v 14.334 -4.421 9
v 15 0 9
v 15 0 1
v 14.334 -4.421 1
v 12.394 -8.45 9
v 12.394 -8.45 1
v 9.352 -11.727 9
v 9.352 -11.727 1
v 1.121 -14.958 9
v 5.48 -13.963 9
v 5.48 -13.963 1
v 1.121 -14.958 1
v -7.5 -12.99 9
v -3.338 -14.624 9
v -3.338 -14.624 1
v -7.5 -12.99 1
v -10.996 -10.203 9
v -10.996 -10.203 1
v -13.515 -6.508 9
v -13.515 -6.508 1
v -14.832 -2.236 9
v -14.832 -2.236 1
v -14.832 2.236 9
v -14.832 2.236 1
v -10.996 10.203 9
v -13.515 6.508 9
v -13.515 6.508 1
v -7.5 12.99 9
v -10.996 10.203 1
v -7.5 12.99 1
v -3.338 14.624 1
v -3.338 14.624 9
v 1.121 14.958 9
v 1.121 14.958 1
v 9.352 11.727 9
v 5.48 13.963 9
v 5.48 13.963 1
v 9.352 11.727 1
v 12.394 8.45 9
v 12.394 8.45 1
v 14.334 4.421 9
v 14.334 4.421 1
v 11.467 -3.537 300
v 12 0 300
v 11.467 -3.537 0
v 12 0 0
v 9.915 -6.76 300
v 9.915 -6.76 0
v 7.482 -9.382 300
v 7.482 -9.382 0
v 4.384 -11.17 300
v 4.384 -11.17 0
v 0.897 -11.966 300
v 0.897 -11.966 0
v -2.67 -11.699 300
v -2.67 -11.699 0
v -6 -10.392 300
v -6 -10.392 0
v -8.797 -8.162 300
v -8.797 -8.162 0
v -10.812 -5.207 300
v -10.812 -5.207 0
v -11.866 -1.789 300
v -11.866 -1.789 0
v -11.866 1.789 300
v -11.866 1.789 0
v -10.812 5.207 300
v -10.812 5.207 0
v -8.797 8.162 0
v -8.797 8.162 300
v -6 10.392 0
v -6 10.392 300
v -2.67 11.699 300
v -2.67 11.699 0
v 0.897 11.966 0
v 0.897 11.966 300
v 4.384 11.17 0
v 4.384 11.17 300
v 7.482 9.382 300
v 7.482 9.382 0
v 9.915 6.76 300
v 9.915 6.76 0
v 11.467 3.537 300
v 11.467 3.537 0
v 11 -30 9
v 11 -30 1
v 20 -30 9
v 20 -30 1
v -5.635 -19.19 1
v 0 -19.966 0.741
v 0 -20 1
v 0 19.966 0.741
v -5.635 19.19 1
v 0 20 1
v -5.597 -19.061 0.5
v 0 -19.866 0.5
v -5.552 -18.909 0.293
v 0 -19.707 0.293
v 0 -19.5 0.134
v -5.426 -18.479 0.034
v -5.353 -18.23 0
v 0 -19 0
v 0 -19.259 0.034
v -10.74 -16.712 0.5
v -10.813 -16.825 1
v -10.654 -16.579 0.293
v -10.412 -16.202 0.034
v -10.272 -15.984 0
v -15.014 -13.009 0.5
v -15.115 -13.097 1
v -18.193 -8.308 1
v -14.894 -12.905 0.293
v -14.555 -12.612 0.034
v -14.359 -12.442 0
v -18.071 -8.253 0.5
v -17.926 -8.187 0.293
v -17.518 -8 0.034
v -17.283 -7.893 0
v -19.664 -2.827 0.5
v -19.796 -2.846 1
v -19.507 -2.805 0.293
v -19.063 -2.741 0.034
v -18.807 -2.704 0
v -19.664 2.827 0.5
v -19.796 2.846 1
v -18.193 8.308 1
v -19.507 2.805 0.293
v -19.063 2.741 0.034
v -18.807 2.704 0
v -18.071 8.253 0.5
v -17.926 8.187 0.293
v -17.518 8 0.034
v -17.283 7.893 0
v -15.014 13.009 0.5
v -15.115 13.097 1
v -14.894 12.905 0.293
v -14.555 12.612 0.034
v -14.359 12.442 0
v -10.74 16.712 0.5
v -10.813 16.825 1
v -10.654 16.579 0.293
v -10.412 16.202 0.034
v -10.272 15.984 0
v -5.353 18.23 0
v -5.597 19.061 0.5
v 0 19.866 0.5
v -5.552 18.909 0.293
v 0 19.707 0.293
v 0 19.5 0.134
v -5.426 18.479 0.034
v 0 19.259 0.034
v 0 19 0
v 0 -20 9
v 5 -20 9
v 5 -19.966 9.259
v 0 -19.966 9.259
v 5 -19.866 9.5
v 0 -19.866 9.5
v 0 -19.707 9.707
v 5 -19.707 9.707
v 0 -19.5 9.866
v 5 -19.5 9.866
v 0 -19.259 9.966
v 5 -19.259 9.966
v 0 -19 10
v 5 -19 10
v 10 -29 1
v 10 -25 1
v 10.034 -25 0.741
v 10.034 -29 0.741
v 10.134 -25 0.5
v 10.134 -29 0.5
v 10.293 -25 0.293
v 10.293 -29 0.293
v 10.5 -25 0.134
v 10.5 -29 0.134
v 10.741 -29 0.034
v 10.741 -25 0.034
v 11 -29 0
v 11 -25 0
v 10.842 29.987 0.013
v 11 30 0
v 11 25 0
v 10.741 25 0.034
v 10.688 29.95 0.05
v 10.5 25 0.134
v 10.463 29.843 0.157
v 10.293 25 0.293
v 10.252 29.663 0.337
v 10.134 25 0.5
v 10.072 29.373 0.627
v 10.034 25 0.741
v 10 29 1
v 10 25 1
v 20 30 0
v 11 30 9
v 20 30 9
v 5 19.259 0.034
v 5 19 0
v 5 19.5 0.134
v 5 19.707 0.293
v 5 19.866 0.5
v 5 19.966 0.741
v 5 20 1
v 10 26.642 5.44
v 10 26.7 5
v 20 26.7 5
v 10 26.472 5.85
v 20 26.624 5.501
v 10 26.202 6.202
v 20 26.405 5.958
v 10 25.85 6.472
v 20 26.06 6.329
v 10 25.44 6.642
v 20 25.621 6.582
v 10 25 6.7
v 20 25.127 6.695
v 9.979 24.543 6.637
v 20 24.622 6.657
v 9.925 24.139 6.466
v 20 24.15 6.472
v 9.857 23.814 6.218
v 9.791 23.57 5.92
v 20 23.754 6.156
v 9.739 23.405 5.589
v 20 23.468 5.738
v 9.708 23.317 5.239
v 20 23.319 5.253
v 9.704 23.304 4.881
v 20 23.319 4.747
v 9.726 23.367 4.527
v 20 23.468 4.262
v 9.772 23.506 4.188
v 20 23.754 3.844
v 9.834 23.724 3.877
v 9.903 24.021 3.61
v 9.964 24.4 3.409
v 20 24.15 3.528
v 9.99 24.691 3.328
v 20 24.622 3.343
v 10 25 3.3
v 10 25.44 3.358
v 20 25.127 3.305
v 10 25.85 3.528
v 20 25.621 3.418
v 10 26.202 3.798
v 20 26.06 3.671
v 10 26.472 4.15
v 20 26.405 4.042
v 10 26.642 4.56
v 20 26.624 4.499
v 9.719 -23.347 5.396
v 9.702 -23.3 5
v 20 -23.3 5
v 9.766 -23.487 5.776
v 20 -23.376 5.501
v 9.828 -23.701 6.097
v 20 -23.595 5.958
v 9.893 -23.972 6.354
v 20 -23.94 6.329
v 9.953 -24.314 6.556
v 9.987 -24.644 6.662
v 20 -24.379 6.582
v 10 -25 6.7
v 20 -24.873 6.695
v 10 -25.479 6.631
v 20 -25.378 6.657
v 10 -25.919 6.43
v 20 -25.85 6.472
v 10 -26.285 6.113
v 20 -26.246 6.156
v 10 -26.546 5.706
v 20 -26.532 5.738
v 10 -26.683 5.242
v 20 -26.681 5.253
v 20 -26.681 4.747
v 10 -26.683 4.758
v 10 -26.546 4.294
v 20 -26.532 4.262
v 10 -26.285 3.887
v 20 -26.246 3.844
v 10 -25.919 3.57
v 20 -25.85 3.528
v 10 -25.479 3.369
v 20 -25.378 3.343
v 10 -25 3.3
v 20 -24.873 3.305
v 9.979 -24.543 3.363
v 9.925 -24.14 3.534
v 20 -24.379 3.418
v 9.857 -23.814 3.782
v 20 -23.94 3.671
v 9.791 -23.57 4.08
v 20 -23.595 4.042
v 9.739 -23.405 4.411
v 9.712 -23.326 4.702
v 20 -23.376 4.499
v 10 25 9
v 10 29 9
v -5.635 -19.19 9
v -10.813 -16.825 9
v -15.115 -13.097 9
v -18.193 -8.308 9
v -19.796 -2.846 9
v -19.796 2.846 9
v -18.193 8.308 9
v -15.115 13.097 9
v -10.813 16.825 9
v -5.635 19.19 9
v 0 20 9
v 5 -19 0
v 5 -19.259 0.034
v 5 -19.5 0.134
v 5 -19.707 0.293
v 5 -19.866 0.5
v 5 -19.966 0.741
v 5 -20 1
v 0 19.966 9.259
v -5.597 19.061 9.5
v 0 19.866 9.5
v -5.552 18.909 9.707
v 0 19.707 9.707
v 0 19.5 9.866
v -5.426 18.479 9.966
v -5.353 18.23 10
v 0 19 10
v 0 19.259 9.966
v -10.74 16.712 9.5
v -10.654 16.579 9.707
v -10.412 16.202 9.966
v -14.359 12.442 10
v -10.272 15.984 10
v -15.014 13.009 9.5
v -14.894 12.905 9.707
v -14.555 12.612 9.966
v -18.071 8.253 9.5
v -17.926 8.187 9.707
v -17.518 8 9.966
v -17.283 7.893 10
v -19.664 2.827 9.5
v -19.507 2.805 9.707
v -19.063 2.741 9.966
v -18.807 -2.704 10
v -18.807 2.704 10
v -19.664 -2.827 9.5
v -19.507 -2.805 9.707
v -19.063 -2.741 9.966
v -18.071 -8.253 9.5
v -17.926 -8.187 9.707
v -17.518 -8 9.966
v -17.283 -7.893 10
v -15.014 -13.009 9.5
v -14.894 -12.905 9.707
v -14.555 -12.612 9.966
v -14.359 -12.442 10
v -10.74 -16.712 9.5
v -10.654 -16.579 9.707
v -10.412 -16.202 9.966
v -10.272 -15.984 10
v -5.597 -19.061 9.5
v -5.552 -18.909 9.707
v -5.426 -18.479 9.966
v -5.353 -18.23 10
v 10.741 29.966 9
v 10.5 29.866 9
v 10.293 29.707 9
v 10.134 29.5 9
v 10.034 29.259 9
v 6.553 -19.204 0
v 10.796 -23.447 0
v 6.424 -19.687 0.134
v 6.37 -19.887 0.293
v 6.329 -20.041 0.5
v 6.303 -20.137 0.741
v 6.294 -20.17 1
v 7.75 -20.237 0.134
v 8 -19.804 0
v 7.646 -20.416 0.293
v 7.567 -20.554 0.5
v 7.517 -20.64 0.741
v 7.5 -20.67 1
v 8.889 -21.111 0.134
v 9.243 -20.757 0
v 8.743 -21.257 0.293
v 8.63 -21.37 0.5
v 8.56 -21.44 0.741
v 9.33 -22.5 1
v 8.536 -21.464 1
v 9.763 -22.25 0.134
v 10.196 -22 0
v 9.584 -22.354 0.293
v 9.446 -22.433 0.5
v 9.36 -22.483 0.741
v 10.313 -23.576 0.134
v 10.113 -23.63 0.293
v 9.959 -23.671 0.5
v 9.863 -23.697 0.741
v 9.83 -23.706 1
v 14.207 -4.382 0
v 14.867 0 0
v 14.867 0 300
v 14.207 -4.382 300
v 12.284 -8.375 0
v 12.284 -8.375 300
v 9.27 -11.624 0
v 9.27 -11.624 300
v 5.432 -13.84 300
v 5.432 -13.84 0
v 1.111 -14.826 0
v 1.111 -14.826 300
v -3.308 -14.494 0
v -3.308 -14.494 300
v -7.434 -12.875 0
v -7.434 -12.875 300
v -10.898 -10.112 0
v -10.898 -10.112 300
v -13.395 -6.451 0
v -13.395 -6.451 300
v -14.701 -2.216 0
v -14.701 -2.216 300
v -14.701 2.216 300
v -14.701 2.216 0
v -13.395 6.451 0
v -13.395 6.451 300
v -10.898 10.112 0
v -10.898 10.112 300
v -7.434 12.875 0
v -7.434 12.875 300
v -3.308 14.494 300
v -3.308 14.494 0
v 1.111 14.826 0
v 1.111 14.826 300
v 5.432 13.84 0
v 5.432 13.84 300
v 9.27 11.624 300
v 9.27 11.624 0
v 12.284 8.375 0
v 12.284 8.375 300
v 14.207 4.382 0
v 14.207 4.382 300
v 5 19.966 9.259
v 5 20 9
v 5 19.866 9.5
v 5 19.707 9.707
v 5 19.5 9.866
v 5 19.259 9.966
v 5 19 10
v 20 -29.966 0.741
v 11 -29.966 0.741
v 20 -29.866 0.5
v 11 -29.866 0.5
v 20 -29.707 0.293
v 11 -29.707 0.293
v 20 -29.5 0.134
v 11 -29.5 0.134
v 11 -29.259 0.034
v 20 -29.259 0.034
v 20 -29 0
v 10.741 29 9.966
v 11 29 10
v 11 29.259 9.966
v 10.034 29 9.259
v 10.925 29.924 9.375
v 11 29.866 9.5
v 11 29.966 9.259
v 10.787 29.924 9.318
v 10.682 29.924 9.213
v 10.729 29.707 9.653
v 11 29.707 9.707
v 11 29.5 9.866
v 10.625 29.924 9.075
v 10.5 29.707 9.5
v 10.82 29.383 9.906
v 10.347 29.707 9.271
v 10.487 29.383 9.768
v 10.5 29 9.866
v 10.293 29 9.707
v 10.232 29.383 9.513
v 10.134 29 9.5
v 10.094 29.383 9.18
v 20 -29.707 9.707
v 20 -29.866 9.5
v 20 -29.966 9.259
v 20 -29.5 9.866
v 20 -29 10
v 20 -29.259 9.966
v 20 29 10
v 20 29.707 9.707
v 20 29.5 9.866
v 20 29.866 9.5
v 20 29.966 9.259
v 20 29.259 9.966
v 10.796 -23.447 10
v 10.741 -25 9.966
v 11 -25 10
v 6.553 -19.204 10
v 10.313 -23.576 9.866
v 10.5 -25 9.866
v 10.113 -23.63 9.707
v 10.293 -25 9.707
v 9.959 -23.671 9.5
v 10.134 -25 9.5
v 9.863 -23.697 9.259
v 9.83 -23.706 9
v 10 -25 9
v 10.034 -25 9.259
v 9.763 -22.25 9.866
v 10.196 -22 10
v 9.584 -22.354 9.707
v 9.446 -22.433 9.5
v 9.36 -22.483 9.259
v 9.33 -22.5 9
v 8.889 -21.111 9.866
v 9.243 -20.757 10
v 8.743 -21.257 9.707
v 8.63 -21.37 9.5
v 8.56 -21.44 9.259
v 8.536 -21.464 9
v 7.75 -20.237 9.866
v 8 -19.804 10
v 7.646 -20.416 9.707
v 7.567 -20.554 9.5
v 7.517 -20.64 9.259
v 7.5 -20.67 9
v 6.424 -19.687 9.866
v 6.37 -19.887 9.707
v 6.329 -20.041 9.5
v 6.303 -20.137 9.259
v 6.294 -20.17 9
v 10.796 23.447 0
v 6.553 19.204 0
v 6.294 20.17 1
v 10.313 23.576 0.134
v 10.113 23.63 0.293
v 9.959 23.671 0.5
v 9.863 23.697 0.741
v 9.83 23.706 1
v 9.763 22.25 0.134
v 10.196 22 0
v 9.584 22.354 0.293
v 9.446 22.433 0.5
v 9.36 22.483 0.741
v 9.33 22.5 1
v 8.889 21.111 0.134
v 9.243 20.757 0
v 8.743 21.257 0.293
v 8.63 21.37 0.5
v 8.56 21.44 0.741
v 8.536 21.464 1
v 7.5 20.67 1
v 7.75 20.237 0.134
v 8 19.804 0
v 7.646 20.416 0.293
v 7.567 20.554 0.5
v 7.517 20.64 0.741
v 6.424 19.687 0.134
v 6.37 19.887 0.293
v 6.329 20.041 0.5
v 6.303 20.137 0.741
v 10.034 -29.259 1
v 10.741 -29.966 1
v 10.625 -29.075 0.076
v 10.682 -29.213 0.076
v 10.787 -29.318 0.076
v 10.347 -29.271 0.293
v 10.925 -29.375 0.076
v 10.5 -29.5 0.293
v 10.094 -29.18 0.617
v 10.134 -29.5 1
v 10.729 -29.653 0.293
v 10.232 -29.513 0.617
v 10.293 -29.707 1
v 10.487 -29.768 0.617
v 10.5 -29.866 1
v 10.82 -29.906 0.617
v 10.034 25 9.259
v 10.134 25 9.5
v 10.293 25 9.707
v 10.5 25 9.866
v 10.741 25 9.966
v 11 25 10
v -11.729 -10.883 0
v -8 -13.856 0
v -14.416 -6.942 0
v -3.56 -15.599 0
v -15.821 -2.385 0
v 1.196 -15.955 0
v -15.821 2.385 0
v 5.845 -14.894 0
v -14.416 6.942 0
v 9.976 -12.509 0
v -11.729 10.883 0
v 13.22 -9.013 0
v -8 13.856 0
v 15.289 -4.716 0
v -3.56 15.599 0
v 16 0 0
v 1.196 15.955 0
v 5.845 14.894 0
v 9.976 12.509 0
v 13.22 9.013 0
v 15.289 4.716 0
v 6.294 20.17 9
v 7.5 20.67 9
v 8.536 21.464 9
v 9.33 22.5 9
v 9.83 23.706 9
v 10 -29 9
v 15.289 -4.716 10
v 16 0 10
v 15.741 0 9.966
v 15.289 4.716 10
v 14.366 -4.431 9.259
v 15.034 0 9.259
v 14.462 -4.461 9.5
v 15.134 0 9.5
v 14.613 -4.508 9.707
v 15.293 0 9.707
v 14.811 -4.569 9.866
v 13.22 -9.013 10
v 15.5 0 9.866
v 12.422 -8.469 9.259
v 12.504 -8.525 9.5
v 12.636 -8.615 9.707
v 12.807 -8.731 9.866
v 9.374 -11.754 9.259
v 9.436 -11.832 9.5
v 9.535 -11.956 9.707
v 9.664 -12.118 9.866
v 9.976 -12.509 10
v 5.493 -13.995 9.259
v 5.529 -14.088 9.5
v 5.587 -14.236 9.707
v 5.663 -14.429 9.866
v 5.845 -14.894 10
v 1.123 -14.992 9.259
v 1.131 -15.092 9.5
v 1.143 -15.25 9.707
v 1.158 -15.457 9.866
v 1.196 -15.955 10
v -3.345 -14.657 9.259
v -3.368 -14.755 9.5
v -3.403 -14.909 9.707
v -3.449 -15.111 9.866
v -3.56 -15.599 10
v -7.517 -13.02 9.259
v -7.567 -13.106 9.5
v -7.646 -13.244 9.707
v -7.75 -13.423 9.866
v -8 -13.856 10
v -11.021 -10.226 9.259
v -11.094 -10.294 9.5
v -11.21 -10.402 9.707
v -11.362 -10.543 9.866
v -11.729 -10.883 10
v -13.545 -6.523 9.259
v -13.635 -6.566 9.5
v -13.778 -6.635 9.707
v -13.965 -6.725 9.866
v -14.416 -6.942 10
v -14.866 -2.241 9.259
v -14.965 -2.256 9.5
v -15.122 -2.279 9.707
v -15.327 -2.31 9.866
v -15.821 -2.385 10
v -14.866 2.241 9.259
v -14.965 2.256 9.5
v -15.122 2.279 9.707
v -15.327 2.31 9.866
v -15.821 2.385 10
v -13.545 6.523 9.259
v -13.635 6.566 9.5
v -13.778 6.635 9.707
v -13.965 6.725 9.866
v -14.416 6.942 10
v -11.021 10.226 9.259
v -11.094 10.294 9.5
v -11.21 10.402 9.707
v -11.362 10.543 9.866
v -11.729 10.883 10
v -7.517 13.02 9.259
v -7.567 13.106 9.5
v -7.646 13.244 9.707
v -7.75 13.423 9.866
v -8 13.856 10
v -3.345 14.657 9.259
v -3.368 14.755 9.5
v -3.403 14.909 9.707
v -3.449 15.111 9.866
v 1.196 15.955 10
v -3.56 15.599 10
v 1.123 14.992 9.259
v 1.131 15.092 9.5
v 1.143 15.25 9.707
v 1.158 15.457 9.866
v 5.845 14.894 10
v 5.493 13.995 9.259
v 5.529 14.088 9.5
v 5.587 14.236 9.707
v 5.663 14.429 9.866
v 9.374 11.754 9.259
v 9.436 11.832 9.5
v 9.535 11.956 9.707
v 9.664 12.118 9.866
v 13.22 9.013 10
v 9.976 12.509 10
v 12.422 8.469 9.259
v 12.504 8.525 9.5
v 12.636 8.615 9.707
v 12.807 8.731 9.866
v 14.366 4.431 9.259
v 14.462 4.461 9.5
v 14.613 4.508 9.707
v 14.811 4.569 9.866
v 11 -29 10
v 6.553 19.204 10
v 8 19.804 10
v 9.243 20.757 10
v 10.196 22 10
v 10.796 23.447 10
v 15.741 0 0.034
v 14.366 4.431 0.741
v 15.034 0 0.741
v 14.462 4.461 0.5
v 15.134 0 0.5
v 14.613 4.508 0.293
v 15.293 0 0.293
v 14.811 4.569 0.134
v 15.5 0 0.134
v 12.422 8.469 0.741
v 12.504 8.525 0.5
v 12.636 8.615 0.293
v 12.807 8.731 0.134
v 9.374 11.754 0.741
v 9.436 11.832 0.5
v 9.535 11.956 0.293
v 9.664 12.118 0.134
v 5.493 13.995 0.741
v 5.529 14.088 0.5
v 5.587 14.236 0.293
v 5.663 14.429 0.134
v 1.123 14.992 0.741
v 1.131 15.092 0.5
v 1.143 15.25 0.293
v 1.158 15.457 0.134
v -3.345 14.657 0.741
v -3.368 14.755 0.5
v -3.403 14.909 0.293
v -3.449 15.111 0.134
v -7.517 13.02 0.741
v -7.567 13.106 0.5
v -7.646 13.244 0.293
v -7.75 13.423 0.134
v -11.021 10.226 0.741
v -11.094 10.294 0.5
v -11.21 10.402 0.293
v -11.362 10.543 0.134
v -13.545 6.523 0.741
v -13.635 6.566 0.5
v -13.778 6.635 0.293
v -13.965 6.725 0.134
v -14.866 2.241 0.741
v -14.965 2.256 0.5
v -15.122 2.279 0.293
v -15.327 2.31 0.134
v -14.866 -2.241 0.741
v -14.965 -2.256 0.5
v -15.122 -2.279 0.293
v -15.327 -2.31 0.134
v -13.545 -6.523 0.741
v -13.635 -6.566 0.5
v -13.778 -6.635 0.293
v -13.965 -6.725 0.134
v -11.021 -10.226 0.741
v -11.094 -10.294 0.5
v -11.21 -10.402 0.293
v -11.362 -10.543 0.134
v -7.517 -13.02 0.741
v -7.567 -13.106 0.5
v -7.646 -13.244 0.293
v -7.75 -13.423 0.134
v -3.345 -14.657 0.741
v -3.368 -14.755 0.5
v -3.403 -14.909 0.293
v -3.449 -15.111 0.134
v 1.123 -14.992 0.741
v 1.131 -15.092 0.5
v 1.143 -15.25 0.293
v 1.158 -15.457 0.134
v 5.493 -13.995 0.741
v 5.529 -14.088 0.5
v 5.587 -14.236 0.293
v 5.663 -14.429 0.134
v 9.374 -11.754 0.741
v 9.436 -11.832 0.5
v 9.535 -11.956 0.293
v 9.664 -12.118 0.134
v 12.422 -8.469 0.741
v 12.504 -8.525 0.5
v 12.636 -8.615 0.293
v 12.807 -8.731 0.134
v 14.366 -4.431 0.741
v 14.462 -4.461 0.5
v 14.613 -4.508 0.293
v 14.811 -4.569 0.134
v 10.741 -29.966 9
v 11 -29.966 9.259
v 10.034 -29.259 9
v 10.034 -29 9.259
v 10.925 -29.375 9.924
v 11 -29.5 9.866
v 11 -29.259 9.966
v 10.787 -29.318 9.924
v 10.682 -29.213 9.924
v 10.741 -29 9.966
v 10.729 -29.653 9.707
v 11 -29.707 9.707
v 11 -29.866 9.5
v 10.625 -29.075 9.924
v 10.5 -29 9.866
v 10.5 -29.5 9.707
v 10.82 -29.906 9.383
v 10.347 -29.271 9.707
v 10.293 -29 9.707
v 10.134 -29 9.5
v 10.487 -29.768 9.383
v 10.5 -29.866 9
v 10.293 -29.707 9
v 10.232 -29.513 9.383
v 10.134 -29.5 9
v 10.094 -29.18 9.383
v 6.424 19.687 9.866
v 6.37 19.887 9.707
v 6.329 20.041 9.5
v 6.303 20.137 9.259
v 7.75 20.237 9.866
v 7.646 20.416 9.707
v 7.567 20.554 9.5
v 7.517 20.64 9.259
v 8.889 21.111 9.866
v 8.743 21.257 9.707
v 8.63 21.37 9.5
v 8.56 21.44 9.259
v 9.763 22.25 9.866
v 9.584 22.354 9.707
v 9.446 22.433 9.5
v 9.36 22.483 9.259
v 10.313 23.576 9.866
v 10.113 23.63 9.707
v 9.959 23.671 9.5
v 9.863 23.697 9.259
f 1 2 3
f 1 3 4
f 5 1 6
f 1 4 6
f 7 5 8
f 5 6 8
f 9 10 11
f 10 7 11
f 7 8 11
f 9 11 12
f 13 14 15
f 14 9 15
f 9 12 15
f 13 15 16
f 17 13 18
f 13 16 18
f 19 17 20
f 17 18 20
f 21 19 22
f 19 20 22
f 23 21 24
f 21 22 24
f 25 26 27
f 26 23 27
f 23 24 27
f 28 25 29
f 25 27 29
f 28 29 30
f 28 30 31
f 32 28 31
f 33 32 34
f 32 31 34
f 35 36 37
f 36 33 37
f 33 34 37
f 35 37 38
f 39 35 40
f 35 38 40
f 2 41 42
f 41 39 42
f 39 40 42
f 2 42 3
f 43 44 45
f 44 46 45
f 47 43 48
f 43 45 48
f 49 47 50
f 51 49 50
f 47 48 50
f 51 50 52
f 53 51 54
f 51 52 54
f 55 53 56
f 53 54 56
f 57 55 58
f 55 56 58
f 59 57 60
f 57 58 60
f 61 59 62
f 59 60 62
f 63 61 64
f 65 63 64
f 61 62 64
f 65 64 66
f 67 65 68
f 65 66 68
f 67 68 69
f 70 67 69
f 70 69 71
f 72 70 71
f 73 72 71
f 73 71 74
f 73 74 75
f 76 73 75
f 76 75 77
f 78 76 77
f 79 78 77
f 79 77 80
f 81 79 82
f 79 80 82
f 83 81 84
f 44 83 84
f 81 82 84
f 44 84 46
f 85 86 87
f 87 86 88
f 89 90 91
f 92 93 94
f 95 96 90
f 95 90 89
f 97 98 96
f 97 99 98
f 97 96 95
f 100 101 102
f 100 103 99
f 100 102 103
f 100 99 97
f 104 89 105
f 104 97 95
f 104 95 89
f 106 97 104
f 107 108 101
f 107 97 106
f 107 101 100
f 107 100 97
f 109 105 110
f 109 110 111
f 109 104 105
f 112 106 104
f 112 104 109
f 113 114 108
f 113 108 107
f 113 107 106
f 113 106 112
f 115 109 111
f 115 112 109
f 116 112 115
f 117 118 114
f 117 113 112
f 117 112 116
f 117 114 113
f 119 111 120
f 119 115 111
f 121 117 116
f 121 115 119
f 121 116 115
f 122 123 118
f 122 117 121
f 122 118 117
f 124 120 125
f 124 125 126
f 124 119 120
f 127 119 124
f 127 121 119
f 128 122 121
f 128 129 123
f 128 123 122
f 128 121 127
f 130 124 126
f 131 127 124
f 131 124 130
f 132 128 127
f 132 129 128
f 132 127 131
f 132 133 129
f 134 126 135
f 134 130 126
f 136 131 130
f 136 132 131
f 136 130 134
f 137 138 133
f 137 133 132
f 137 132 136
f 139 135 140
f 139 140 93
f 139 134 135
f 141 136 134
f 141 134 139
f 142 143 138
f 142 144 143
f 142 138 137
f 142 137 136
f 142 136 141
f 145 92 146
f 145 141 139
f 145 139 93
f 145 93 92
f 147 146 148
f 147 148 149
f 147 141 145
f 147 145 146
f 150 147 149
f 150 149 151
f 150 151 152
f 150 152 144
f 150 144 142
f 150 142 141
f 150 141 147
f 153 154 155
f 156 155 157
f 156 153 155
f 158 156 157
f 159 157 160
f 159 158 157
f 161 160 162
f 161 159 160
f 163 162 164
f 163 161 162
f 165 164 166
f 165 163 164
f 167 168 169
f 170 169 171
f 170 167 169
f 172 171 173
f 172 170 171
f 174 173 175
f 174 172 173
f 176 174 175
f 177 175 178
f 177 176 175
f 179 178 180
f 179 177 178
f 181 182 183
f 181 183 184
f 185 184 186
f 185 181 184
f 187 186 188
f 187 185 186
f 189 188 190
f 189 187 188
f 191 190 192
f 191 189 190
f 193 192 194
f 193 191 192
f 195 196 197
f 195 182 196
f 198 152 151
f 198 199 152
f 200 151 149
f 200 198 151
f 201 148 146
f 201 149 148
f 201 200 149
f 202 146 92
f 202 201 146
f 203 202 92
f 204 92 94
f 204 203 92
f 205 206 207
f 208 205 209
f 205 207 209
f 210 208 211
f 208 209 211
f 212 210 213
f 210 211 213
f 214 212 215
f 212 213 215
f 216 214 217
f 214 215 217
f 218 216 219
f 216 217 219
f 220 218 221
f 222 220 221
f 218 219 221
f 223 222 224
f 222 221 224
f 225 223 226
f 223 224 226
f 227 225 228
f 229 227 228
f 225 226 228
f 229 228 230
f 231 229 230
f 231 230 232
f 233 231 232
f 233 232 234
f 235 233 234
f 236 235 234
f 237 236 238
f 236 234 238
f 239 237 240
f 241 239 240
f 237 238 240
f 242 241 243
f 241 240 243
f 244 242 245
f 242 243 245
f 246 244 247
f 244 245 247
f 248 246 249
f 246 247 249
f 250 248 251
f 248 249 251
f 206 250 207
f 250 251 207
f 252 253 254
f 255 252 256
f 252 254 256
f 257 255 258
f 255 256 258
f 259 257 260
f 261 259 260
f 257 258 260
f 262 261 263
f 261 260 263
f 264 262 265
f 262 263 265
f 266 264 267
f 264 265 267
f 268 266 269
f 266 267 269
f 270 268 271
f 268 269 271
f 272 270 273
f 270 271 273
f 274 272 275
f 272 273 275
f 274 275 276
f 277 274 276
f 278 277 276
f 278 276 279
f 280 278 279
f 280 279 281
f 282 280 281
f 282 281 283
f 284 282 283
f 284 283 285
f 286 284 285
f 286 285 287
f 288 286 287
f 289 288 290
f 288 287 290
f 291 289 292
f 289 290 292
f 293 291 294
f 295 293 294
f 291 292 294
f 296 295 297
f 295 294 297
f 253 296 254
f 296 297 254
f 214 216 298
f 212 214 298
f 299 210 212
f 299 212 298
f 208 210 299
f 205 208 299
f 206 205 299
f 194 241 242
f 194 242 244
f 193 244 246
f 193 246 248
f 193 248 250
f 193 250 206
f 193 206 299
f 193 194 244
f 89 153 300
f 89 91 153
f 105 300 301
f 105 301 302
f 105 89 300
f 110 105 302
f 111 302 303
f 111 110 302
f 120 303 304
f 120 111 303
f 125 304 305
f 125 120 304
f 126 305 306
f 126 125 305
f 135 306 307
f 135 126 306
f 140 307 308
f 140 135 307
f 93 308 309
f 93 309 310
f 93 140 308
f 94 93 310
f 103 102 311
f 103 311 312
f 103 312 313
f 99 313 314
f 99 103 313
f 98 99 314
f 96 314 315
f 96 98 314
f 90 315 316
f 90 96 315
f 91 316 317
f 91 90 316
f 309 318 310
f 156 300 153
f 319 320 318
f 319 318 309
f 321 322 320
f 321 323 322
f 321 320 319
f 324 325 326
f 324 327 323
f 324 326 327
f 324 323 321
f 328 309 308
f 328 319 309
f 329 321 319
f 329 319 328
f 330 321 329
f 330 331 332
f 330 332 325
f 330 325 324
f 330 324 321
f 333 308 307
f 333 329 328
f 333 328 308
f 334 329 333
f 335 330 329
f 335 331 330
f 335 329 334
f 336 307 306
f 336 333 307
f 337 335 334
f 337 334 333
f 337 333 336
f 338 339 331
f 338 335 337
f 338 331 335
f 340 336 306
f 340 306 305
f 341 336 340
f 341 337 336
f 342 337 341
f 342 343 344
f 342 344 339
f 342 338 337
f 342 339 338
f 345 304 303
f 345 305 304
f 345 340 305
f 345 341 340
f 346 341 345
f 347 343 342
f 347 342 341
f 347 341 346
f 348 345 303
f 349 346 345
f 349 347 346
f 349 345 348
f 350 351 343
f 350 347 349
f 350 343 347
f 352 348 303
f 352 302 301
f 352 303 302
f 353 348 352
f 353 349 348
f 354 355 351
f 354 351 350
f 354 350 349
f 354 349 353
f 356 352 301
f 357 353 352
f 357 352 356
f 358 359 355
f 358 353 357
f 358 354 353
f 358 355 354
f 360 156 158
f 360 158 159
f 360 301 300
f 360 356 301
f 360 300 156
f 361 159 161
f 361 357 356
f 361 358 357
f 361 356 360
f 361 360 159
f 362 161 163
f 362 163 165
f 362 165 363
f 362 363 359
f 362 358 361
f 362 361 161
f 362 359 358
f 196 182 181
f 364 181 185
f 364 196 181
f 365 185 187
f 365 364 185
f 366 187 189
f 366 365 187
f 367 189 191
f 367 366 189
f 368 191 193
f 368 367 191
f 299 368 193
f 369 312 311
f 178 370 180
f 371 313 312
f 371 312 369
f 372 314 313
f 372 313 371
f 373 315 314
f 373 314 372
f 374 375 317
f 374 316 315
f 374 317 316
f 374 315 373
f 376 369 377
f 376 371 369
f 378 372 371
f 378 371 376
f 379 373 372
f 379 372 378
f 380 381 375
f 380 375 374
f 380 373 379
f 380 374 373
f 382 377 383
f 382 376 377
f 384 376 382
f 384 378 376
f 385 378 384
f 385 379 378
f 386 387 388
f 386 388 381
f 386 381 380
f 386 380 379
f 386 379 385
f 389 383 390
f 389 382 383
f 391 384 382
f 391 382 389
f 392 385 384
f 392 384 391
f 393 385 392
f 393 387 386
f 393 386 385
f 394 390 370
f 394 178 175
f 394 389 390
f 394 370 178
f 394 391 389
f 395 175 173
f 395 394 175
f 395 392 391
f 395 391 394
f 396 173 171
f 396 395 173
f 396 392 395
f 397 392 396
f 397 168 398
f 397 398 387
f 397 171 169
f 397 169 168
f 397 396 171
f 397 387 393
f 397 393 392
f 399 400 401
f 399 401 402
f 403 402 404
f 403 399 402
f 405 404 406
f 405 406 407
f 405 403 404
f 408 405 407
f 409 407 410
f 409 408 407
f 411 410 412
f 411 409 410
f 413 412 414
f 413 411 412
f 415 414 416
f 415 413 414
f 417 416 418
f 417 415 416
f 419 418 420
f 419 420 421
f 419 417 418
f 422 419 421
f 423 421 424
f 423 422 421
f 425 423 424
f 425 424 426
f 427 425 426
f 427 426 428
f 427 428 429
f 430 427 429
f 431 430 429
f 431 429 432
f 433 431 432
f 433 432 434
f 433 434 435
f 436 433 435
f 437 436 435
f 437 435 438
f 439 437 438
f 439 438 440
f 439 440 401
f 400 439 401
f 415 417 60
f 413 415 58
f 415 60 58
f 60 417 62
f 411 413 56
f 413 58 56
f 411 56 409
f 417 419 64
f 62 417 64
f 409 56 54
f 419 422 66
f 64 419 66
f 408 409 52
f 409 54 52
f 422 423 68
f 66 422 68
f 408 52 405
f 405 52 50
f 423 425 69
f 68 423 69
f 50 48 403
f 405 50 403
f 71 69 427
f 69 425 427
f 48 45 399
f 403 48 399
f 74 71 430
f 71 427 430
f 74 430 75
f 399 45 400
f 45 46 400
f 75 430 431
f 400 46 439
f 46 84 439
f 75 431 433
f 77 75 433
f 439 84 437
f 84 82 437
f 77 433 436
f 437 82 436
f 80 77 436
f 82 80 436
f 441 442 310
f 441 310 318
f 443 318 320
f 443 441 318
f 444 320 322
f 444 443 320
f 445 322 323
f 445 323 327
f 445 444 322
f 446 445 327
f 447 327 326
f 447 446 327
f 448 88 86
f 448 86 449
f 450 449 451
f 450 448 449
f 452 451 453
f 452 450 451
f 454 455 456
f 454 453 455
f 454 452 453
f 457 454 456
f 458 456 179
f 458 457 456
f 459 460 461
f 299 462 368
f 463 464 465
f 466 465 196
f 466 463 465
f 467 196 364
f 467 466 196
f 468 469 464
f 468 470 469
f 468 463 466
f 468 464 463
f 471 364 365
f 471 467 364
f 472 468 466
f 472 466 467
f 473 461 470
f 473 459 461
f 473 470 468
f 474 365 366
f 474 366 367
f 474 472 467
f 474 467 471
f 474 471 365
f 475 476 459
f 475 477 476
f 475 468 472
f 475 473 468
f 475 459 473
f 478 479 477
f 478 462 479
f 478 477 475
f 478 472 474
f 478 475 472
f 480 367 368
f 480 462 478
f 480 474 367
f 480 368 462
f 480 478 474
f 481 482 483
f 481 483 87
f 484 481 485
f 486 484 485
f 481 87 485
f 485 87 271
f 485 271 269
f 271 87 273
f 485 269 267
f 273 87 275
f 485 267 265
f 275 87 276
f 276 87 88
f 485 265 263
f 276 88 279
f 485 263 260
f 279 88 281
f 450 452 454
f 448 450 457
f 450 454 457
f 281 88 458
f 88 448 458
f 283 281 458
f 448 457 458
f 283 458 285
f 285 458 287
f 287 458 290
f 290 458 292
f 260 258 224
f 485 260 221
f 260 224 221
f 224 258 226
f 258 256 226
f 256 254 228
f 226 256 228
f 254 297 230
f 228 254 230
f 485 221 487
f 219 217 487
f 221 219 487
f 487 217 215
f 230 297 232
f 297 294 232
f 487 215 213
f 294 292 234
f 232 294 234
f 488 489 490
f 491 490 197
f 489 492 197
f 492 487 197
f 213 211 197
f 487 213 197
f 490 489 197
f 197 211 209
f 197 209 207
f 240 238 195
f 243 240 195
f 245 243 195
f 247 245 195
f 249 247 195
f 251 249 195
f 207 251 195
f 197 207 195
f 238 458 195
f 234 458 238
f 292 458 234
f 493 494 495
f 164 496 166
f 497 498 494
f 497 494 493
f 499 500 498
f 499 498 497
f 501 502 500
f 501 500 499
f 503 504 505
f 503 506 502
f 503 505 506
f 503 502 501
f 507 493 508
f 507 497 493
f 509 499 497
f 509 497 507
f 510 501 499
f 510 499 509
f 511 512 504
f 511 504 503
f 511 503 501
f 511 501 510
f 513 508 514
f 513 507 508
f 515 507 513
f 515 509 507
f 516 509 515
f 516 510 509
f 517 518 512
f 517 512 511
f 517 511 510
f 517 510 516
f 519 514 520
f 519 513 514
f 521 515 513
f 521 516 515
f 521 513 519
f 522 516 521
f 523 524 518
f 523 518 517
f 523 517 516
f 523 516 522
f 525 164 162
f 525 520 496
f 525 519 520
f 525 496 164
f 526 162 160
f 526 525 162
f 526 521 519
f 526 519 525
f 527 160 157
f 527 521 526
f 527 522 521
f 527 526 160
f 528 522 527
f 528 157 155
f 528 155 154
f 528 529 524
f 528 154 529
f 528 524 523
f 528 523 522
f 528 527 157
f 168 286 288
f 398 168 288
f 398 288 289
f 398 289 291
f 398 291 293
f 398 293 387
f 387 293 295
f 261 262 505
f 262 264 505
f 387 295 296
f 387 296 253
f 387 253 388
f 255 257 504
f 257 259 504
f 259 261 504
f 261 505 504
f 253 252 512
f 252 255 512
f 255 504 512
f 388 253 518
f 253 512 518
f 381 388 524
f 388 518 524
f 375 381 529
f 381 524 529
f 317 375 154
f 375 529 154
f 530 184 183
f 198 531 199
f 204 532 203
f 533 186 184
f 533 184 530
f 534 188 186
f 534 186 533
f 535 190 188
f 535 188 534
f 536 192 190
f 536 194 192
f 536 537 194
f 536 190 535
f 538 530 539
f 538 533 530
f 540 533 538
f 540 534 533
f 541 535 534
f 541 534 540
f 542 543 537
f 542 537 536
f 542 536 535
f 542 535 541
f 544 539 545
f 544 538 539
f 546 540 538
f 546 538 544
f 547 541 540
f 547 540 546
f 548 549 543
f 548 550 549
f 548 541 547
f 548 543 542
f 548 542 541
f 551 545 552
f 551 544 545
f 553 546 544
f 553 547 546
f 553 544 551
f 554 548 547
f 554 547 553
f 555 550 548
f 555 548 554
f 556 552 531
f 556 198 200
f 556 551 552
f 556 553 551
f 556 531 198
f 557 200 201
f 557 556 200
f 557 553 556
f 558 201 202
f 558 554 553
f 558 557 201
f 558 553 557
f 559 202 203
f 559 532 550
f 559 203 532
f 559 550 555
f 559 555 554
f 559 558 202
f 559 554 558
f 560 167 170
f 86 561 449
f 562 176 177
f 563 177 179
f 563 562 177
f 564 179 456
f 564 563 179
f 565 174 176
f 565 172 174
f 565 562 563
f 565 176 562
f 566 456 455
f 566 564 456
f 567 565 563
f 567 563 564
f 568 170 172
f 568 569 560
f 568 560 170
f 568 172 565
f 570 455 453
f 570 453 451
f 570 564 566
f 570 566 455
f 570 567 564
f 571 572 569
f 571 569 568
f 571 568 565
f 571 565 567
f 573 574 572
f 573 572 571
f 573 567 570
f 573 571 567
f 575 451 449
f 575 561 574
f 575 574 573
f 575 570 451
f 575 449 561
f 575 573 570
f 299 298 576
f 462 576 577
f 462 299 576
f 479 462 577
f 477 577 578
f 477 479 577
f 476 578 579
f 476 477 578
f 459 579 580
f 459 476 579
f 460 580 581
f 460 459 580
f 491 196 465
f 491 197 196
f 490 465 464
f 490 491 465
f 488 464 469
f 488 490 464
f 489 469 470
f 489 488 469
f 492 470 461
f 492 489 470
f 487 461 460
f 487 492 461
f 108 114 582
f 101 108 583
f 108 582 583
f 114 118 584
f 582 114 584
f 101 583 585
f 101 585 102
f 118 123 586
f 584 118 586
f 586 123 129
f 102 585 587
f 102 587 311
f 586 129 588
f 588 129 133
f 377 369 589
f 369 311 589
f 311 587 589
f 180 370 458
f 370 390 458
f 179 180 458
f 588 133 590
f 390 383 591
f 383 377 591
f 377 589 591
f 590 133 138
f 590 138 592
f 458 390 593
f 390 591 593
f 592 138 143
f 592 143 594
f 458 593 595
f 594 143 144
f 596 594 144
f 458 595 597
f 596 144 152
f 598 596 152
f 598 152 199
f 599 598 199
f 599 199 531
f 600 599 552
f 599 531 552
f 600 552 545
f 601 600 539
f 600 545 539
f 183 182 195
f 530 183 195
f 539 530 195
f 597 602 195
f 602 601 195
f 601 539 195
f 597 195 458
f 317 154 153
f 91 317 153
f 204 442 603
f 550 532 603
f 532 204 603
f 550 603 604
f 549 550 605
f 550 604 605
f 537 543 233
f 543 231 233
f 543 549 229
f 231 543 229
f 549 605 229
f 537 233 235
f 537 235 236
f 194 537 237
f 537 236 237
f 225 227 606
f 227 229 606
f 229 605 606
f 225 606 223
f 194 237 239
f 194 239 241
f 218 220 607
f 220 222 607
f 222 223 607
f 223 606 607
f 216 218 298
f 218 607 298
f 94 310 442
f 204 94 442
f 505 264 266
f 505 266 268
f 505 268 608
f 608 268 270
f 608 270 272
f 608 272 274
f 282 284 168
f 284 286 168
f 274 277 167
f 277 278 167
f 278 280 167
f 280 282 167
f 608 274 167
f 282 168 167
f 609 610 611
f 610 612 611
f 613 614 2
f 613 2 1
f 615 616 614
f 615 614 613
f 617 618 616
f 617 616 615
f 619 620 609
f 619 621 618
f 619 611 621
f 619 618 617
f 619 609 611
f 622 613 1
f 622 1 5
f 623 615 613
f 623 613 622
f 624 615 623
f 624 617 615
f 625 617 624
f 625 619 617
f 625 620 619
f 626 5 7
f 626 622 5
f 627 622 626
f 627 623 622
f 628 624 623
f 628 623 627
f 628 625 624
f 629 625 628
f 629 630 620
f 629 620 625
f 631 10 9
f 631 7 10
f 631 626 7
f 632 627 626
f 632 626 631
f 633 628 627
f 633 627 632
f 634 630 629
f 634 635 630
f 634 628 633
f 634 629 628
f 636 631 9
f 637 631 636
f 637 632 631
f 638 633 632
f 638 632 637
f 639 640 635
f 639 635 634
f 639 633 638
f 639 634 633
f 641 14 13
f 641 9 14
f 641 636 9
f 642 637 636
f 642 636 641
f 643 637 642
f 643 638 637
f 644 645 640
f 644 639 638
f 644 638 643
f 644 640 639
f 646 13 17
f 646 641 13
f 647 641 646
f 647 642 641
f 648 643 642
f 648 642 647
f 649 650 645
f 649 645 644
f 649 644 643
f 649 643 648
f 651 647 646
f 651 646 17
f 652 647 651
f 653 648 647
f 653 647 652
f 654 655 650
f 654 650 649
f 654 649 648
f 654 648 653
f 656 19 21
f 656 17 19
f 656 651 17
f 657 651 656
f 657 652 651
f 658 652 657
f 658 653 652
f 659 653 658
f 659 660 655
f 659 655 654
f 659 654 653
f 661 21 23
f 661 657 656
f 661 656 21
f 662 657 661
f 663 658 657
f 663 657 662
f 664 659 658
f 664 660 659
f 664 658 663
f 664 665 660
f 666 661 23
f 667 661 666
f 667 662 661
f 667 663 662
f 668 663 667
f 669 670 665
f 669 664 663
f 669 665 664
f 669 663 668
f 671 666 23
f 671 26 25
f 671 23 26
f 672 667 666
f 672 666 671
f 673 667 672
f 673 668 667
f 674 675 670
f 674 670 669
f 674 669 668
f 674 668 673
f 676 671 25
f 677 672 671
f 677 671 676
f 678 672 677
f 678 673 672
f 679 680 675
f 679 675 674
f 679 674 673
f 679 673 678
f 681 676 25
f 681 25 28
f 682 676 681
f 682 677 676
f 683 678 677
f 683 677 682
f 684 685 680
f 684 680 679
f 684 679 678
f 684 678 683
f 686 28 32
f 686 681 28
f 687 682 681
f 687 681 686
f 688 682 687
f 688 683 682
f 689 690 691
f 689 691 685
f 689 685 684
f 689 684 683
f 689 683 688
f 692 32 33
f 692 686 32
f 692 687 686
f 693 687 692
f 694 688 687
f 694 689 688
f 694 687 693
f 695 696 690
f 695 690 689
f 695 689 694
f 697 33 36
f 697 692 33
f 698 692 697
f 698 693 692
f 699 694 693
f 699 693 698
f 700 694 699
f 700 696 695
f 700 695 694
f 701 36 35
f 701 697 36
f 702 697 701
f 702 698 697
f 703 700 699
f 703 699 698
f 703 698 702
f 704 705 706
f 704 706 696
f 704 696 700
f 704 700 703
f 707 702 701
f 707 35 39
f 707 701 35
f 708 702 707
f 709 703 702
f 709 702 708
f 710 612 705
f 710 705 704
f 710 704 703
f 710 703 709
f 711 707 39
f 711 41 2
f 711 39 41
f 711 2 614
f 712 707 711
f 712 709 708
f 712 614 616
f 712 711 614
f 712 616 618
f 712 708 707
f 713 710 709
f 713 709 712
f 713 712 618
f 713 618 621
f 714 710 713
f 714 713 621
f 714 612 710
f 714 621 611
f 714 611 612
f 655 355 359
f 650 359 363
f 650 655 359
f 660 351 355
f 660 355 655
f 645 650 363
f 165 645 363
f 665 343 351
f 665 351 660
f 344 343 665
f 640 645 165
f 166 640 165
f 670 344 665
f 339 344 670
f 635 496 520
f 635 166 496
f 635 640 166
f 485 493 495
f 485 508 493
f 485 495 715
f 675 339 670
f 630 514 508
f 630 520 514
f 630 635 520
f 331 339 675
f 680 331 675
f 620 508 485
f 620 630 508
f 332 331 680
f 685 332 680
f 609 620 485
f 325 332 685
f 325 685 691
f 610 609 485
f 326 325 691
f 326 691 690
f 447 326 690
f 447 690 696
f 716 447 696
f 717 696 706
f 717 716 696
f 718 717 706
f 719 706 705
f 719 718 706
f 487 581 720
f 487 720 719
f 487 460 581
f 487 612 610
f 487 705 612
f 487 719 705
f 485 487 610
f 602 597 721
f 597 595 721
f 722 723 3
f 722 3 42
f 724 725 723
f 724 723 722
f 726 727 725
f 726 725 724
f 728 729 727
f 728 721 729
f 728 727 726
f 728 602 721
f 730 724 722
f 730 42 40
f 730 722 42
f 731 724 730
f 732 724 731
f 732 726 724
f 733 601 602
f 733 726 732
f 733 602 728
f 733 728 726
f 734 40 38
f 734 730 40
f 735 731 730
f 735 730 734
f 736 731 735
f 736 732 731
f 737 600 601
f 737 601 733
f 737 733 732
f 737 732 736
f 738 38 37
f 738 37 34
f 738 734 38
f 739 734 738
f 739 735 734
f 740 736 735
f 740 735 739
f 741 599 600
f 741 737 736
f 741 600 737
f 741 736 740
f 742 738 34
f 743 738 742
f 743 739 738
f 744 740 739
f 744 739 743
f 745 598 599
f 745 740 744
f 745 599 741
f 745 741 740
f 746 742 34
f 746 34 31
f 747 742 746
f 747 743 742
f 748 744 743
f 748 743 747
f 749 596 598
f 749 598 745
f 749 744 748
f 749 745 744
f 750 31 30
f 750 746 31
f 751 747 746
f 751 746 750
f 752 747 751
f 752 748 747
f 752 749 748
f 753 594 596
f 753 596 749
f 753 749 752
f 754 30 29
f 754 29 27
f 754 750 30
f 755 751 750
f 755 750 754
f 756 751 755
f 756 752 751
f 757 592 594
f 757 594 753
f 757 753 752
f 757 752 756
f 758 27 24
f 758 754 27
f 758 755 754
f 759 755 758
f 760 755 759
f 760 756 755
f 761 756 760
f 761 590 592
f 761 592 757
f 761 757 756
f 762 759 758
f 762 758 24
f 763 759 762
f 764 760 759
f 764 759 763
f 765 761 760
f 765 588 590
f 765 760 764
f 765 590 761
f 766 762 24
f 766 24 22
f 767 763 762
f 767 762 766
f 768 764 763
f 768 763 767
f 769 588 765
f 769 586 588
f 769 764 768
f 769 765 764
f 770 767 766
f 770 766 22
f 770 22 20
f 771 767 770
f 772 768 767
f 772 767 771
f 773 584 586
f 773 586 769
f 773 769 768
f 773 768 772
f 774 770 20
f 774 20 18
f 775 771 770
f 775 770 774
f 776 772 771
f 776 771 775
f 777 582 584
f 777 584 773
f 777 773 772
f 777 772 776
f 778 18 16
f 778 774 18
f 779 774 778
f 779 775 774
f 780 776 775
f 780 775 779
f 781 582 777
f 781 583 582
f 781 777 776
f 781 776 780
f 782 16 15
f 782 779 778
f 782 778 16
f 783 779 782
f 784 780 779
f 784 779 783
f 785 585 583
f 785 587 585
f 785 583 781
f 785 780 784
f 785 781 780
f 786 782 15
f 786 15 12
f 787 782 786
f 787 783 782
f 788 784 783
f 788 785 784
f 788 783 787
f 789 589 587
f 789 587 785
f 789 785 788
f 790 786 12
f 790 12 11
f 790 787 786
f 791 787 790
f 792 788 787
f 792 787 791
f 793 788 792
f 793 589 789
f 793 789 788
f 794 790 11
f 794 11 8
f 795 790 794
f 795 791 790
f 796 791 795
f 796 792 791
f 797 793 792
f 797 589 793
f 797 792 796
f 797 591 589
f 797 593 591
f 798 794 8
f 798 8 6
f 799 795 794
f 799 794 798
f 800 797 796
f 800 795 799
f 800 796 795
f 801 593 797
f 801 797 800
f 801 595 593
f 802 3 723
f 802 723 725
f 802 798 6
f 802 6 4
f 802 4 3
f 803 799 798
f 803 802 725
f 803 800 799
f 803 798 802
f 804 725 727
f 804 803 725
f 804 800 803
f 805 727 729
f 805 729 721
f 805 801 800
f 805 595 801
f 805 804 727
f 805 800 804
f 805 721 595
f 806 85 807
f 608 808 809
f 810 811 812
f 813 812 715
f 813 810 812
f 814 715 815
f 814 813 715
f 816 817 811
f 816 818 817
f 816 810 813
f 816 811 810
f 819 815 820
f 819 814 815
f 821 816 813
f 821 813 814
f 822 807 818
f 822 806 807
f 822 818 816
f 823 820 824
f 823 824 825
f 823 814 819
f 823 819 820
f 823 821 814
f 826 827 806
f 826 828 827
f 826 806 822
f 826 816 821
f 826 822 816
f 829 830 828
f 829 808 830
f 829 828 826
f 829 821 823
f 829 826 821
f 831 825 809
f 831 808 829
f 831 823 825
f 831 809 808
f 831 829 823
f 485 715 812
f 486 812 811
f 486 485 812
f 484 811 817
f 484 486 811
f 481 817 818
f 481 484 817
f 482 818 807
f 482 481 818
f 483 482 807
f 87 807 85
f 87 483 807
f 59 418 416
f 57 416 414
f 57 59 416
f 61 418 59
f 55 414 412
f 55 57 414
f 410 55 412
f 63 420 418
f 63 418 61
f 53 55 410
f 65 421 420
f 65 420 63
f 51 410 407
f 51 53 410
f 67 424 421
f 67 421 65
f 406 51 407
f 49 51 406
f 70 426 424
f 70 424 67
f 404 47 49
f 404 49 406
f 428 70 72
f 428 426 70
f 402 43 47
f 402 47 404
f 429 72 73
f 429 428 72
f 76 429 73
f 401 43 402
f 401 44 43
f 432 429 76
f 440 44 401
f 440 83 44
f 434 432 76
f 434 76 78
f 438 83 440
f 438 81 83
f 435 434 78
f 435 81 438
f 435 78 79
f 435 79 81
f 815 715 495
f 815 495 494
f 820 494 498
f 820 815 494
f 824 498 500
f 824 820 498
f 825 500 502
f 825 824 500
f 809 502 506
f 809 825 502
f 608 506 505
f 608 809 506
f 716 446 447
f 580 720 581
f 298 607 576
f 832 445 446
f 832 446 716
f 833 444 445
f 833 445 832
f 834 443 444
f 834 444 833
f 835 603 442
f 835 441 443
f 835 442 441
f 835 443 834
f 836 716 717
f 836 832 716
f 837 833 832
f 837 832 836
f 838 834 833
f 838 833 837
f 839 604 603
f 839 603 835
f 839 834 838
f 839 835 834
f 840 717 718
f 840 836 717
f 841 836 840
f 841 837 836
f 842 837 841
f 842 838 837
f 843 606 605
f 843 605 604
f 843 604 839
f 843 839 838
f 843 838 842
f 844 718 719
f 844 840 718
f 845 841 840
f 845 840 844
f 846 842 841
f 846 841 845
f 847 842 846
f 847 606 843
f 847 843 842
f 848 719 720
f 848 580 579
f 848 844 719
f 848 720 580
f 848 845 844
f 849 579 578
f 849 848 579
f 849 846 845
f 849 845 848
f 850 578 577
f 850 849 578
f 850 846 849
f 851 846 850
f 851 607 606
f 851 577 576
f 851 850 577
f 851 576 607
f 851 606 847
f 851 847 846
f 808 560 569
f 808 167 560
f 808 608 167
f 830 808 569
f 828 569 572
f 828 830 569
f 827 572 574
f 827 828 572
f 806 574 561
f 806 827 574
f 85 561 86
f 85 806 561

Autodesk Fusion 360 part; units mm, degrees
sketch "Esquisse1" plane through (0, 0, 0) normal (0, 0, 1) x (1, 0, 0) in component "Pipe"
  circle A0 centre (0, 0) radius 15
  circle A1 centre (0, 0) radius 12
  dimension "d8" = 30
  dimension "d9" = 3
extrude "Extrusion1" add sketch "Esquisse1" along normal blind 300 makes body 1 in component "Pipe"
thread "Filetage1" "ISO Metric profile 30.0 M30x3.5 6g" major diameter 29.7345 minor diameter 25.732 pitch 3.5 angle 60 resizes the face on face at (14.9814, -0.7477, 200) on bodies 1 in component "Pipe"
sketch "Esquisse1 (2)" plane through (0, 0, 0) normal (0, 0, 1) x (1, 0, 0) in component "Pipe_Support"
  circle A0 centre (0, 0) radius 15
  line L0 (0, 20) -> (20, 20)
  line L1 (20, 20) -> (20, -20)
  line L2 (20, -20) -> (0, -20)
  line L3 (0, -20) -> (0, 20) construction
  arc A1 (0, 20) -> (0, -20) centre (0, 0) ccw
  line L4 (20, -20) -> (10, -20)
  line L5 (10, -20) -> (10, -30)
  line L6 (10, -30) -> (20, -30)
  line L7 (20, -30) -> (20, -20)
  line L8 (20, 20) -> (10, 20)
  line L9 (10, 20) -> (10, 30)
  line L10 (10, 30) -> (20, 30)
  line L11 (20, 30) -> (20, 20)
  dimension "d12" = 30
  dimension "d13" = 5
  dimension "d14" = 20
  dimension "d15" = 40
  dimension "d16" = 20
  dimension "d17" = 20
  dimension "d20" = 10
  dimension "d21" = 10
  dimension "d22" = 10
  dimension "d23" = 10
extrude "Extrusion1'" add sketch "Esquisse1 (2)" along normal blind 10 separate body makes body 2 in component "Pipe_Support"
fillet "Congé1" radius 5 2 edges at (10, -20, 5) (10, 20, 5) on bodies 2 in component "Pipe_Support"
fillet "Congé1" radius 1 17 edges at (10, -30, 5) (15, -30, 10) (15, -30, 0) (10, -25, 10) (10, -25, 0) (10, 25, 10) (15, 30, 10) (10, 25, 0) (10, 30, 5) (5, 20, 10) (-20, 0, 10) (5, -20, 10) (5, 20, 0) (-20, 0, 0) (5, -20, 0) (-13.9849, 5.4242, 10) (-13.9849, 5.4242, 0) on bodies 2 in component "Pipe_Support"
sketch "Esquisse2" plane through (20, 0, 0) normal (1, 0, 0) x (0, 1, 0) in component "Pipe_Support"
  arc A0 (30, 9) -> (29, 10) centre (29, 9) ccw
  line L0 (29, 10) -> (-29, 10)
  arc A1 (-29, 10) -> (-30, 9) centre (-29, 9) ccw
  line L1 (-30, 9) -> (-30, 1)
  arc A2 (-30, 1) -> (-29, 0) centre (-29, 1) ccw
  line L2 (-29, 0) -> (30, 0)
  line L3 (30, 0) -> (30, 9)
  line L4 (-30, 10) -> (-20, 10) construction
  line L5 (-20, 10) -> (-20, 0) construction
  line L6 (-20, 0) -> (-30, 0) construction
  line L7 (-30, 0) -> (-30, 10) construction
  circle A3 centre (-25, 5) radius 1.7
  line L8 (0, 0) -> (0, 10) construction
  circle A4 centre (25, 5) radius 1.7
  dimension "d28" = 10
  dimension "d29" = 10
  dimension "d31" = 10
  dimension "d32" = 3.4
  dimension "d33" = 5
  dimension "d34" = 5
  dimension "d37" = 20
extrude "Extrusion2" cut sketch "Esquisse2" against normal through all contours A3 | A4 bodies 2 in component "Pipe_Support"
component "Pipe" placed x (1, 0, 0) y (0, 1, 0) z (0, 0, 1) at (0, 0, 0)
component "Pipe_Support" placed x (1, 0, 0) y (0, 1, 0) z (0, 0, 1) at (0, 0, 0)
equation "d14 = d12 / 2 + d13"
equation "d15 = d12 + 2 * d13"
equation "d16 = d14"
equation "d17 = d12 / 2 + d13"
